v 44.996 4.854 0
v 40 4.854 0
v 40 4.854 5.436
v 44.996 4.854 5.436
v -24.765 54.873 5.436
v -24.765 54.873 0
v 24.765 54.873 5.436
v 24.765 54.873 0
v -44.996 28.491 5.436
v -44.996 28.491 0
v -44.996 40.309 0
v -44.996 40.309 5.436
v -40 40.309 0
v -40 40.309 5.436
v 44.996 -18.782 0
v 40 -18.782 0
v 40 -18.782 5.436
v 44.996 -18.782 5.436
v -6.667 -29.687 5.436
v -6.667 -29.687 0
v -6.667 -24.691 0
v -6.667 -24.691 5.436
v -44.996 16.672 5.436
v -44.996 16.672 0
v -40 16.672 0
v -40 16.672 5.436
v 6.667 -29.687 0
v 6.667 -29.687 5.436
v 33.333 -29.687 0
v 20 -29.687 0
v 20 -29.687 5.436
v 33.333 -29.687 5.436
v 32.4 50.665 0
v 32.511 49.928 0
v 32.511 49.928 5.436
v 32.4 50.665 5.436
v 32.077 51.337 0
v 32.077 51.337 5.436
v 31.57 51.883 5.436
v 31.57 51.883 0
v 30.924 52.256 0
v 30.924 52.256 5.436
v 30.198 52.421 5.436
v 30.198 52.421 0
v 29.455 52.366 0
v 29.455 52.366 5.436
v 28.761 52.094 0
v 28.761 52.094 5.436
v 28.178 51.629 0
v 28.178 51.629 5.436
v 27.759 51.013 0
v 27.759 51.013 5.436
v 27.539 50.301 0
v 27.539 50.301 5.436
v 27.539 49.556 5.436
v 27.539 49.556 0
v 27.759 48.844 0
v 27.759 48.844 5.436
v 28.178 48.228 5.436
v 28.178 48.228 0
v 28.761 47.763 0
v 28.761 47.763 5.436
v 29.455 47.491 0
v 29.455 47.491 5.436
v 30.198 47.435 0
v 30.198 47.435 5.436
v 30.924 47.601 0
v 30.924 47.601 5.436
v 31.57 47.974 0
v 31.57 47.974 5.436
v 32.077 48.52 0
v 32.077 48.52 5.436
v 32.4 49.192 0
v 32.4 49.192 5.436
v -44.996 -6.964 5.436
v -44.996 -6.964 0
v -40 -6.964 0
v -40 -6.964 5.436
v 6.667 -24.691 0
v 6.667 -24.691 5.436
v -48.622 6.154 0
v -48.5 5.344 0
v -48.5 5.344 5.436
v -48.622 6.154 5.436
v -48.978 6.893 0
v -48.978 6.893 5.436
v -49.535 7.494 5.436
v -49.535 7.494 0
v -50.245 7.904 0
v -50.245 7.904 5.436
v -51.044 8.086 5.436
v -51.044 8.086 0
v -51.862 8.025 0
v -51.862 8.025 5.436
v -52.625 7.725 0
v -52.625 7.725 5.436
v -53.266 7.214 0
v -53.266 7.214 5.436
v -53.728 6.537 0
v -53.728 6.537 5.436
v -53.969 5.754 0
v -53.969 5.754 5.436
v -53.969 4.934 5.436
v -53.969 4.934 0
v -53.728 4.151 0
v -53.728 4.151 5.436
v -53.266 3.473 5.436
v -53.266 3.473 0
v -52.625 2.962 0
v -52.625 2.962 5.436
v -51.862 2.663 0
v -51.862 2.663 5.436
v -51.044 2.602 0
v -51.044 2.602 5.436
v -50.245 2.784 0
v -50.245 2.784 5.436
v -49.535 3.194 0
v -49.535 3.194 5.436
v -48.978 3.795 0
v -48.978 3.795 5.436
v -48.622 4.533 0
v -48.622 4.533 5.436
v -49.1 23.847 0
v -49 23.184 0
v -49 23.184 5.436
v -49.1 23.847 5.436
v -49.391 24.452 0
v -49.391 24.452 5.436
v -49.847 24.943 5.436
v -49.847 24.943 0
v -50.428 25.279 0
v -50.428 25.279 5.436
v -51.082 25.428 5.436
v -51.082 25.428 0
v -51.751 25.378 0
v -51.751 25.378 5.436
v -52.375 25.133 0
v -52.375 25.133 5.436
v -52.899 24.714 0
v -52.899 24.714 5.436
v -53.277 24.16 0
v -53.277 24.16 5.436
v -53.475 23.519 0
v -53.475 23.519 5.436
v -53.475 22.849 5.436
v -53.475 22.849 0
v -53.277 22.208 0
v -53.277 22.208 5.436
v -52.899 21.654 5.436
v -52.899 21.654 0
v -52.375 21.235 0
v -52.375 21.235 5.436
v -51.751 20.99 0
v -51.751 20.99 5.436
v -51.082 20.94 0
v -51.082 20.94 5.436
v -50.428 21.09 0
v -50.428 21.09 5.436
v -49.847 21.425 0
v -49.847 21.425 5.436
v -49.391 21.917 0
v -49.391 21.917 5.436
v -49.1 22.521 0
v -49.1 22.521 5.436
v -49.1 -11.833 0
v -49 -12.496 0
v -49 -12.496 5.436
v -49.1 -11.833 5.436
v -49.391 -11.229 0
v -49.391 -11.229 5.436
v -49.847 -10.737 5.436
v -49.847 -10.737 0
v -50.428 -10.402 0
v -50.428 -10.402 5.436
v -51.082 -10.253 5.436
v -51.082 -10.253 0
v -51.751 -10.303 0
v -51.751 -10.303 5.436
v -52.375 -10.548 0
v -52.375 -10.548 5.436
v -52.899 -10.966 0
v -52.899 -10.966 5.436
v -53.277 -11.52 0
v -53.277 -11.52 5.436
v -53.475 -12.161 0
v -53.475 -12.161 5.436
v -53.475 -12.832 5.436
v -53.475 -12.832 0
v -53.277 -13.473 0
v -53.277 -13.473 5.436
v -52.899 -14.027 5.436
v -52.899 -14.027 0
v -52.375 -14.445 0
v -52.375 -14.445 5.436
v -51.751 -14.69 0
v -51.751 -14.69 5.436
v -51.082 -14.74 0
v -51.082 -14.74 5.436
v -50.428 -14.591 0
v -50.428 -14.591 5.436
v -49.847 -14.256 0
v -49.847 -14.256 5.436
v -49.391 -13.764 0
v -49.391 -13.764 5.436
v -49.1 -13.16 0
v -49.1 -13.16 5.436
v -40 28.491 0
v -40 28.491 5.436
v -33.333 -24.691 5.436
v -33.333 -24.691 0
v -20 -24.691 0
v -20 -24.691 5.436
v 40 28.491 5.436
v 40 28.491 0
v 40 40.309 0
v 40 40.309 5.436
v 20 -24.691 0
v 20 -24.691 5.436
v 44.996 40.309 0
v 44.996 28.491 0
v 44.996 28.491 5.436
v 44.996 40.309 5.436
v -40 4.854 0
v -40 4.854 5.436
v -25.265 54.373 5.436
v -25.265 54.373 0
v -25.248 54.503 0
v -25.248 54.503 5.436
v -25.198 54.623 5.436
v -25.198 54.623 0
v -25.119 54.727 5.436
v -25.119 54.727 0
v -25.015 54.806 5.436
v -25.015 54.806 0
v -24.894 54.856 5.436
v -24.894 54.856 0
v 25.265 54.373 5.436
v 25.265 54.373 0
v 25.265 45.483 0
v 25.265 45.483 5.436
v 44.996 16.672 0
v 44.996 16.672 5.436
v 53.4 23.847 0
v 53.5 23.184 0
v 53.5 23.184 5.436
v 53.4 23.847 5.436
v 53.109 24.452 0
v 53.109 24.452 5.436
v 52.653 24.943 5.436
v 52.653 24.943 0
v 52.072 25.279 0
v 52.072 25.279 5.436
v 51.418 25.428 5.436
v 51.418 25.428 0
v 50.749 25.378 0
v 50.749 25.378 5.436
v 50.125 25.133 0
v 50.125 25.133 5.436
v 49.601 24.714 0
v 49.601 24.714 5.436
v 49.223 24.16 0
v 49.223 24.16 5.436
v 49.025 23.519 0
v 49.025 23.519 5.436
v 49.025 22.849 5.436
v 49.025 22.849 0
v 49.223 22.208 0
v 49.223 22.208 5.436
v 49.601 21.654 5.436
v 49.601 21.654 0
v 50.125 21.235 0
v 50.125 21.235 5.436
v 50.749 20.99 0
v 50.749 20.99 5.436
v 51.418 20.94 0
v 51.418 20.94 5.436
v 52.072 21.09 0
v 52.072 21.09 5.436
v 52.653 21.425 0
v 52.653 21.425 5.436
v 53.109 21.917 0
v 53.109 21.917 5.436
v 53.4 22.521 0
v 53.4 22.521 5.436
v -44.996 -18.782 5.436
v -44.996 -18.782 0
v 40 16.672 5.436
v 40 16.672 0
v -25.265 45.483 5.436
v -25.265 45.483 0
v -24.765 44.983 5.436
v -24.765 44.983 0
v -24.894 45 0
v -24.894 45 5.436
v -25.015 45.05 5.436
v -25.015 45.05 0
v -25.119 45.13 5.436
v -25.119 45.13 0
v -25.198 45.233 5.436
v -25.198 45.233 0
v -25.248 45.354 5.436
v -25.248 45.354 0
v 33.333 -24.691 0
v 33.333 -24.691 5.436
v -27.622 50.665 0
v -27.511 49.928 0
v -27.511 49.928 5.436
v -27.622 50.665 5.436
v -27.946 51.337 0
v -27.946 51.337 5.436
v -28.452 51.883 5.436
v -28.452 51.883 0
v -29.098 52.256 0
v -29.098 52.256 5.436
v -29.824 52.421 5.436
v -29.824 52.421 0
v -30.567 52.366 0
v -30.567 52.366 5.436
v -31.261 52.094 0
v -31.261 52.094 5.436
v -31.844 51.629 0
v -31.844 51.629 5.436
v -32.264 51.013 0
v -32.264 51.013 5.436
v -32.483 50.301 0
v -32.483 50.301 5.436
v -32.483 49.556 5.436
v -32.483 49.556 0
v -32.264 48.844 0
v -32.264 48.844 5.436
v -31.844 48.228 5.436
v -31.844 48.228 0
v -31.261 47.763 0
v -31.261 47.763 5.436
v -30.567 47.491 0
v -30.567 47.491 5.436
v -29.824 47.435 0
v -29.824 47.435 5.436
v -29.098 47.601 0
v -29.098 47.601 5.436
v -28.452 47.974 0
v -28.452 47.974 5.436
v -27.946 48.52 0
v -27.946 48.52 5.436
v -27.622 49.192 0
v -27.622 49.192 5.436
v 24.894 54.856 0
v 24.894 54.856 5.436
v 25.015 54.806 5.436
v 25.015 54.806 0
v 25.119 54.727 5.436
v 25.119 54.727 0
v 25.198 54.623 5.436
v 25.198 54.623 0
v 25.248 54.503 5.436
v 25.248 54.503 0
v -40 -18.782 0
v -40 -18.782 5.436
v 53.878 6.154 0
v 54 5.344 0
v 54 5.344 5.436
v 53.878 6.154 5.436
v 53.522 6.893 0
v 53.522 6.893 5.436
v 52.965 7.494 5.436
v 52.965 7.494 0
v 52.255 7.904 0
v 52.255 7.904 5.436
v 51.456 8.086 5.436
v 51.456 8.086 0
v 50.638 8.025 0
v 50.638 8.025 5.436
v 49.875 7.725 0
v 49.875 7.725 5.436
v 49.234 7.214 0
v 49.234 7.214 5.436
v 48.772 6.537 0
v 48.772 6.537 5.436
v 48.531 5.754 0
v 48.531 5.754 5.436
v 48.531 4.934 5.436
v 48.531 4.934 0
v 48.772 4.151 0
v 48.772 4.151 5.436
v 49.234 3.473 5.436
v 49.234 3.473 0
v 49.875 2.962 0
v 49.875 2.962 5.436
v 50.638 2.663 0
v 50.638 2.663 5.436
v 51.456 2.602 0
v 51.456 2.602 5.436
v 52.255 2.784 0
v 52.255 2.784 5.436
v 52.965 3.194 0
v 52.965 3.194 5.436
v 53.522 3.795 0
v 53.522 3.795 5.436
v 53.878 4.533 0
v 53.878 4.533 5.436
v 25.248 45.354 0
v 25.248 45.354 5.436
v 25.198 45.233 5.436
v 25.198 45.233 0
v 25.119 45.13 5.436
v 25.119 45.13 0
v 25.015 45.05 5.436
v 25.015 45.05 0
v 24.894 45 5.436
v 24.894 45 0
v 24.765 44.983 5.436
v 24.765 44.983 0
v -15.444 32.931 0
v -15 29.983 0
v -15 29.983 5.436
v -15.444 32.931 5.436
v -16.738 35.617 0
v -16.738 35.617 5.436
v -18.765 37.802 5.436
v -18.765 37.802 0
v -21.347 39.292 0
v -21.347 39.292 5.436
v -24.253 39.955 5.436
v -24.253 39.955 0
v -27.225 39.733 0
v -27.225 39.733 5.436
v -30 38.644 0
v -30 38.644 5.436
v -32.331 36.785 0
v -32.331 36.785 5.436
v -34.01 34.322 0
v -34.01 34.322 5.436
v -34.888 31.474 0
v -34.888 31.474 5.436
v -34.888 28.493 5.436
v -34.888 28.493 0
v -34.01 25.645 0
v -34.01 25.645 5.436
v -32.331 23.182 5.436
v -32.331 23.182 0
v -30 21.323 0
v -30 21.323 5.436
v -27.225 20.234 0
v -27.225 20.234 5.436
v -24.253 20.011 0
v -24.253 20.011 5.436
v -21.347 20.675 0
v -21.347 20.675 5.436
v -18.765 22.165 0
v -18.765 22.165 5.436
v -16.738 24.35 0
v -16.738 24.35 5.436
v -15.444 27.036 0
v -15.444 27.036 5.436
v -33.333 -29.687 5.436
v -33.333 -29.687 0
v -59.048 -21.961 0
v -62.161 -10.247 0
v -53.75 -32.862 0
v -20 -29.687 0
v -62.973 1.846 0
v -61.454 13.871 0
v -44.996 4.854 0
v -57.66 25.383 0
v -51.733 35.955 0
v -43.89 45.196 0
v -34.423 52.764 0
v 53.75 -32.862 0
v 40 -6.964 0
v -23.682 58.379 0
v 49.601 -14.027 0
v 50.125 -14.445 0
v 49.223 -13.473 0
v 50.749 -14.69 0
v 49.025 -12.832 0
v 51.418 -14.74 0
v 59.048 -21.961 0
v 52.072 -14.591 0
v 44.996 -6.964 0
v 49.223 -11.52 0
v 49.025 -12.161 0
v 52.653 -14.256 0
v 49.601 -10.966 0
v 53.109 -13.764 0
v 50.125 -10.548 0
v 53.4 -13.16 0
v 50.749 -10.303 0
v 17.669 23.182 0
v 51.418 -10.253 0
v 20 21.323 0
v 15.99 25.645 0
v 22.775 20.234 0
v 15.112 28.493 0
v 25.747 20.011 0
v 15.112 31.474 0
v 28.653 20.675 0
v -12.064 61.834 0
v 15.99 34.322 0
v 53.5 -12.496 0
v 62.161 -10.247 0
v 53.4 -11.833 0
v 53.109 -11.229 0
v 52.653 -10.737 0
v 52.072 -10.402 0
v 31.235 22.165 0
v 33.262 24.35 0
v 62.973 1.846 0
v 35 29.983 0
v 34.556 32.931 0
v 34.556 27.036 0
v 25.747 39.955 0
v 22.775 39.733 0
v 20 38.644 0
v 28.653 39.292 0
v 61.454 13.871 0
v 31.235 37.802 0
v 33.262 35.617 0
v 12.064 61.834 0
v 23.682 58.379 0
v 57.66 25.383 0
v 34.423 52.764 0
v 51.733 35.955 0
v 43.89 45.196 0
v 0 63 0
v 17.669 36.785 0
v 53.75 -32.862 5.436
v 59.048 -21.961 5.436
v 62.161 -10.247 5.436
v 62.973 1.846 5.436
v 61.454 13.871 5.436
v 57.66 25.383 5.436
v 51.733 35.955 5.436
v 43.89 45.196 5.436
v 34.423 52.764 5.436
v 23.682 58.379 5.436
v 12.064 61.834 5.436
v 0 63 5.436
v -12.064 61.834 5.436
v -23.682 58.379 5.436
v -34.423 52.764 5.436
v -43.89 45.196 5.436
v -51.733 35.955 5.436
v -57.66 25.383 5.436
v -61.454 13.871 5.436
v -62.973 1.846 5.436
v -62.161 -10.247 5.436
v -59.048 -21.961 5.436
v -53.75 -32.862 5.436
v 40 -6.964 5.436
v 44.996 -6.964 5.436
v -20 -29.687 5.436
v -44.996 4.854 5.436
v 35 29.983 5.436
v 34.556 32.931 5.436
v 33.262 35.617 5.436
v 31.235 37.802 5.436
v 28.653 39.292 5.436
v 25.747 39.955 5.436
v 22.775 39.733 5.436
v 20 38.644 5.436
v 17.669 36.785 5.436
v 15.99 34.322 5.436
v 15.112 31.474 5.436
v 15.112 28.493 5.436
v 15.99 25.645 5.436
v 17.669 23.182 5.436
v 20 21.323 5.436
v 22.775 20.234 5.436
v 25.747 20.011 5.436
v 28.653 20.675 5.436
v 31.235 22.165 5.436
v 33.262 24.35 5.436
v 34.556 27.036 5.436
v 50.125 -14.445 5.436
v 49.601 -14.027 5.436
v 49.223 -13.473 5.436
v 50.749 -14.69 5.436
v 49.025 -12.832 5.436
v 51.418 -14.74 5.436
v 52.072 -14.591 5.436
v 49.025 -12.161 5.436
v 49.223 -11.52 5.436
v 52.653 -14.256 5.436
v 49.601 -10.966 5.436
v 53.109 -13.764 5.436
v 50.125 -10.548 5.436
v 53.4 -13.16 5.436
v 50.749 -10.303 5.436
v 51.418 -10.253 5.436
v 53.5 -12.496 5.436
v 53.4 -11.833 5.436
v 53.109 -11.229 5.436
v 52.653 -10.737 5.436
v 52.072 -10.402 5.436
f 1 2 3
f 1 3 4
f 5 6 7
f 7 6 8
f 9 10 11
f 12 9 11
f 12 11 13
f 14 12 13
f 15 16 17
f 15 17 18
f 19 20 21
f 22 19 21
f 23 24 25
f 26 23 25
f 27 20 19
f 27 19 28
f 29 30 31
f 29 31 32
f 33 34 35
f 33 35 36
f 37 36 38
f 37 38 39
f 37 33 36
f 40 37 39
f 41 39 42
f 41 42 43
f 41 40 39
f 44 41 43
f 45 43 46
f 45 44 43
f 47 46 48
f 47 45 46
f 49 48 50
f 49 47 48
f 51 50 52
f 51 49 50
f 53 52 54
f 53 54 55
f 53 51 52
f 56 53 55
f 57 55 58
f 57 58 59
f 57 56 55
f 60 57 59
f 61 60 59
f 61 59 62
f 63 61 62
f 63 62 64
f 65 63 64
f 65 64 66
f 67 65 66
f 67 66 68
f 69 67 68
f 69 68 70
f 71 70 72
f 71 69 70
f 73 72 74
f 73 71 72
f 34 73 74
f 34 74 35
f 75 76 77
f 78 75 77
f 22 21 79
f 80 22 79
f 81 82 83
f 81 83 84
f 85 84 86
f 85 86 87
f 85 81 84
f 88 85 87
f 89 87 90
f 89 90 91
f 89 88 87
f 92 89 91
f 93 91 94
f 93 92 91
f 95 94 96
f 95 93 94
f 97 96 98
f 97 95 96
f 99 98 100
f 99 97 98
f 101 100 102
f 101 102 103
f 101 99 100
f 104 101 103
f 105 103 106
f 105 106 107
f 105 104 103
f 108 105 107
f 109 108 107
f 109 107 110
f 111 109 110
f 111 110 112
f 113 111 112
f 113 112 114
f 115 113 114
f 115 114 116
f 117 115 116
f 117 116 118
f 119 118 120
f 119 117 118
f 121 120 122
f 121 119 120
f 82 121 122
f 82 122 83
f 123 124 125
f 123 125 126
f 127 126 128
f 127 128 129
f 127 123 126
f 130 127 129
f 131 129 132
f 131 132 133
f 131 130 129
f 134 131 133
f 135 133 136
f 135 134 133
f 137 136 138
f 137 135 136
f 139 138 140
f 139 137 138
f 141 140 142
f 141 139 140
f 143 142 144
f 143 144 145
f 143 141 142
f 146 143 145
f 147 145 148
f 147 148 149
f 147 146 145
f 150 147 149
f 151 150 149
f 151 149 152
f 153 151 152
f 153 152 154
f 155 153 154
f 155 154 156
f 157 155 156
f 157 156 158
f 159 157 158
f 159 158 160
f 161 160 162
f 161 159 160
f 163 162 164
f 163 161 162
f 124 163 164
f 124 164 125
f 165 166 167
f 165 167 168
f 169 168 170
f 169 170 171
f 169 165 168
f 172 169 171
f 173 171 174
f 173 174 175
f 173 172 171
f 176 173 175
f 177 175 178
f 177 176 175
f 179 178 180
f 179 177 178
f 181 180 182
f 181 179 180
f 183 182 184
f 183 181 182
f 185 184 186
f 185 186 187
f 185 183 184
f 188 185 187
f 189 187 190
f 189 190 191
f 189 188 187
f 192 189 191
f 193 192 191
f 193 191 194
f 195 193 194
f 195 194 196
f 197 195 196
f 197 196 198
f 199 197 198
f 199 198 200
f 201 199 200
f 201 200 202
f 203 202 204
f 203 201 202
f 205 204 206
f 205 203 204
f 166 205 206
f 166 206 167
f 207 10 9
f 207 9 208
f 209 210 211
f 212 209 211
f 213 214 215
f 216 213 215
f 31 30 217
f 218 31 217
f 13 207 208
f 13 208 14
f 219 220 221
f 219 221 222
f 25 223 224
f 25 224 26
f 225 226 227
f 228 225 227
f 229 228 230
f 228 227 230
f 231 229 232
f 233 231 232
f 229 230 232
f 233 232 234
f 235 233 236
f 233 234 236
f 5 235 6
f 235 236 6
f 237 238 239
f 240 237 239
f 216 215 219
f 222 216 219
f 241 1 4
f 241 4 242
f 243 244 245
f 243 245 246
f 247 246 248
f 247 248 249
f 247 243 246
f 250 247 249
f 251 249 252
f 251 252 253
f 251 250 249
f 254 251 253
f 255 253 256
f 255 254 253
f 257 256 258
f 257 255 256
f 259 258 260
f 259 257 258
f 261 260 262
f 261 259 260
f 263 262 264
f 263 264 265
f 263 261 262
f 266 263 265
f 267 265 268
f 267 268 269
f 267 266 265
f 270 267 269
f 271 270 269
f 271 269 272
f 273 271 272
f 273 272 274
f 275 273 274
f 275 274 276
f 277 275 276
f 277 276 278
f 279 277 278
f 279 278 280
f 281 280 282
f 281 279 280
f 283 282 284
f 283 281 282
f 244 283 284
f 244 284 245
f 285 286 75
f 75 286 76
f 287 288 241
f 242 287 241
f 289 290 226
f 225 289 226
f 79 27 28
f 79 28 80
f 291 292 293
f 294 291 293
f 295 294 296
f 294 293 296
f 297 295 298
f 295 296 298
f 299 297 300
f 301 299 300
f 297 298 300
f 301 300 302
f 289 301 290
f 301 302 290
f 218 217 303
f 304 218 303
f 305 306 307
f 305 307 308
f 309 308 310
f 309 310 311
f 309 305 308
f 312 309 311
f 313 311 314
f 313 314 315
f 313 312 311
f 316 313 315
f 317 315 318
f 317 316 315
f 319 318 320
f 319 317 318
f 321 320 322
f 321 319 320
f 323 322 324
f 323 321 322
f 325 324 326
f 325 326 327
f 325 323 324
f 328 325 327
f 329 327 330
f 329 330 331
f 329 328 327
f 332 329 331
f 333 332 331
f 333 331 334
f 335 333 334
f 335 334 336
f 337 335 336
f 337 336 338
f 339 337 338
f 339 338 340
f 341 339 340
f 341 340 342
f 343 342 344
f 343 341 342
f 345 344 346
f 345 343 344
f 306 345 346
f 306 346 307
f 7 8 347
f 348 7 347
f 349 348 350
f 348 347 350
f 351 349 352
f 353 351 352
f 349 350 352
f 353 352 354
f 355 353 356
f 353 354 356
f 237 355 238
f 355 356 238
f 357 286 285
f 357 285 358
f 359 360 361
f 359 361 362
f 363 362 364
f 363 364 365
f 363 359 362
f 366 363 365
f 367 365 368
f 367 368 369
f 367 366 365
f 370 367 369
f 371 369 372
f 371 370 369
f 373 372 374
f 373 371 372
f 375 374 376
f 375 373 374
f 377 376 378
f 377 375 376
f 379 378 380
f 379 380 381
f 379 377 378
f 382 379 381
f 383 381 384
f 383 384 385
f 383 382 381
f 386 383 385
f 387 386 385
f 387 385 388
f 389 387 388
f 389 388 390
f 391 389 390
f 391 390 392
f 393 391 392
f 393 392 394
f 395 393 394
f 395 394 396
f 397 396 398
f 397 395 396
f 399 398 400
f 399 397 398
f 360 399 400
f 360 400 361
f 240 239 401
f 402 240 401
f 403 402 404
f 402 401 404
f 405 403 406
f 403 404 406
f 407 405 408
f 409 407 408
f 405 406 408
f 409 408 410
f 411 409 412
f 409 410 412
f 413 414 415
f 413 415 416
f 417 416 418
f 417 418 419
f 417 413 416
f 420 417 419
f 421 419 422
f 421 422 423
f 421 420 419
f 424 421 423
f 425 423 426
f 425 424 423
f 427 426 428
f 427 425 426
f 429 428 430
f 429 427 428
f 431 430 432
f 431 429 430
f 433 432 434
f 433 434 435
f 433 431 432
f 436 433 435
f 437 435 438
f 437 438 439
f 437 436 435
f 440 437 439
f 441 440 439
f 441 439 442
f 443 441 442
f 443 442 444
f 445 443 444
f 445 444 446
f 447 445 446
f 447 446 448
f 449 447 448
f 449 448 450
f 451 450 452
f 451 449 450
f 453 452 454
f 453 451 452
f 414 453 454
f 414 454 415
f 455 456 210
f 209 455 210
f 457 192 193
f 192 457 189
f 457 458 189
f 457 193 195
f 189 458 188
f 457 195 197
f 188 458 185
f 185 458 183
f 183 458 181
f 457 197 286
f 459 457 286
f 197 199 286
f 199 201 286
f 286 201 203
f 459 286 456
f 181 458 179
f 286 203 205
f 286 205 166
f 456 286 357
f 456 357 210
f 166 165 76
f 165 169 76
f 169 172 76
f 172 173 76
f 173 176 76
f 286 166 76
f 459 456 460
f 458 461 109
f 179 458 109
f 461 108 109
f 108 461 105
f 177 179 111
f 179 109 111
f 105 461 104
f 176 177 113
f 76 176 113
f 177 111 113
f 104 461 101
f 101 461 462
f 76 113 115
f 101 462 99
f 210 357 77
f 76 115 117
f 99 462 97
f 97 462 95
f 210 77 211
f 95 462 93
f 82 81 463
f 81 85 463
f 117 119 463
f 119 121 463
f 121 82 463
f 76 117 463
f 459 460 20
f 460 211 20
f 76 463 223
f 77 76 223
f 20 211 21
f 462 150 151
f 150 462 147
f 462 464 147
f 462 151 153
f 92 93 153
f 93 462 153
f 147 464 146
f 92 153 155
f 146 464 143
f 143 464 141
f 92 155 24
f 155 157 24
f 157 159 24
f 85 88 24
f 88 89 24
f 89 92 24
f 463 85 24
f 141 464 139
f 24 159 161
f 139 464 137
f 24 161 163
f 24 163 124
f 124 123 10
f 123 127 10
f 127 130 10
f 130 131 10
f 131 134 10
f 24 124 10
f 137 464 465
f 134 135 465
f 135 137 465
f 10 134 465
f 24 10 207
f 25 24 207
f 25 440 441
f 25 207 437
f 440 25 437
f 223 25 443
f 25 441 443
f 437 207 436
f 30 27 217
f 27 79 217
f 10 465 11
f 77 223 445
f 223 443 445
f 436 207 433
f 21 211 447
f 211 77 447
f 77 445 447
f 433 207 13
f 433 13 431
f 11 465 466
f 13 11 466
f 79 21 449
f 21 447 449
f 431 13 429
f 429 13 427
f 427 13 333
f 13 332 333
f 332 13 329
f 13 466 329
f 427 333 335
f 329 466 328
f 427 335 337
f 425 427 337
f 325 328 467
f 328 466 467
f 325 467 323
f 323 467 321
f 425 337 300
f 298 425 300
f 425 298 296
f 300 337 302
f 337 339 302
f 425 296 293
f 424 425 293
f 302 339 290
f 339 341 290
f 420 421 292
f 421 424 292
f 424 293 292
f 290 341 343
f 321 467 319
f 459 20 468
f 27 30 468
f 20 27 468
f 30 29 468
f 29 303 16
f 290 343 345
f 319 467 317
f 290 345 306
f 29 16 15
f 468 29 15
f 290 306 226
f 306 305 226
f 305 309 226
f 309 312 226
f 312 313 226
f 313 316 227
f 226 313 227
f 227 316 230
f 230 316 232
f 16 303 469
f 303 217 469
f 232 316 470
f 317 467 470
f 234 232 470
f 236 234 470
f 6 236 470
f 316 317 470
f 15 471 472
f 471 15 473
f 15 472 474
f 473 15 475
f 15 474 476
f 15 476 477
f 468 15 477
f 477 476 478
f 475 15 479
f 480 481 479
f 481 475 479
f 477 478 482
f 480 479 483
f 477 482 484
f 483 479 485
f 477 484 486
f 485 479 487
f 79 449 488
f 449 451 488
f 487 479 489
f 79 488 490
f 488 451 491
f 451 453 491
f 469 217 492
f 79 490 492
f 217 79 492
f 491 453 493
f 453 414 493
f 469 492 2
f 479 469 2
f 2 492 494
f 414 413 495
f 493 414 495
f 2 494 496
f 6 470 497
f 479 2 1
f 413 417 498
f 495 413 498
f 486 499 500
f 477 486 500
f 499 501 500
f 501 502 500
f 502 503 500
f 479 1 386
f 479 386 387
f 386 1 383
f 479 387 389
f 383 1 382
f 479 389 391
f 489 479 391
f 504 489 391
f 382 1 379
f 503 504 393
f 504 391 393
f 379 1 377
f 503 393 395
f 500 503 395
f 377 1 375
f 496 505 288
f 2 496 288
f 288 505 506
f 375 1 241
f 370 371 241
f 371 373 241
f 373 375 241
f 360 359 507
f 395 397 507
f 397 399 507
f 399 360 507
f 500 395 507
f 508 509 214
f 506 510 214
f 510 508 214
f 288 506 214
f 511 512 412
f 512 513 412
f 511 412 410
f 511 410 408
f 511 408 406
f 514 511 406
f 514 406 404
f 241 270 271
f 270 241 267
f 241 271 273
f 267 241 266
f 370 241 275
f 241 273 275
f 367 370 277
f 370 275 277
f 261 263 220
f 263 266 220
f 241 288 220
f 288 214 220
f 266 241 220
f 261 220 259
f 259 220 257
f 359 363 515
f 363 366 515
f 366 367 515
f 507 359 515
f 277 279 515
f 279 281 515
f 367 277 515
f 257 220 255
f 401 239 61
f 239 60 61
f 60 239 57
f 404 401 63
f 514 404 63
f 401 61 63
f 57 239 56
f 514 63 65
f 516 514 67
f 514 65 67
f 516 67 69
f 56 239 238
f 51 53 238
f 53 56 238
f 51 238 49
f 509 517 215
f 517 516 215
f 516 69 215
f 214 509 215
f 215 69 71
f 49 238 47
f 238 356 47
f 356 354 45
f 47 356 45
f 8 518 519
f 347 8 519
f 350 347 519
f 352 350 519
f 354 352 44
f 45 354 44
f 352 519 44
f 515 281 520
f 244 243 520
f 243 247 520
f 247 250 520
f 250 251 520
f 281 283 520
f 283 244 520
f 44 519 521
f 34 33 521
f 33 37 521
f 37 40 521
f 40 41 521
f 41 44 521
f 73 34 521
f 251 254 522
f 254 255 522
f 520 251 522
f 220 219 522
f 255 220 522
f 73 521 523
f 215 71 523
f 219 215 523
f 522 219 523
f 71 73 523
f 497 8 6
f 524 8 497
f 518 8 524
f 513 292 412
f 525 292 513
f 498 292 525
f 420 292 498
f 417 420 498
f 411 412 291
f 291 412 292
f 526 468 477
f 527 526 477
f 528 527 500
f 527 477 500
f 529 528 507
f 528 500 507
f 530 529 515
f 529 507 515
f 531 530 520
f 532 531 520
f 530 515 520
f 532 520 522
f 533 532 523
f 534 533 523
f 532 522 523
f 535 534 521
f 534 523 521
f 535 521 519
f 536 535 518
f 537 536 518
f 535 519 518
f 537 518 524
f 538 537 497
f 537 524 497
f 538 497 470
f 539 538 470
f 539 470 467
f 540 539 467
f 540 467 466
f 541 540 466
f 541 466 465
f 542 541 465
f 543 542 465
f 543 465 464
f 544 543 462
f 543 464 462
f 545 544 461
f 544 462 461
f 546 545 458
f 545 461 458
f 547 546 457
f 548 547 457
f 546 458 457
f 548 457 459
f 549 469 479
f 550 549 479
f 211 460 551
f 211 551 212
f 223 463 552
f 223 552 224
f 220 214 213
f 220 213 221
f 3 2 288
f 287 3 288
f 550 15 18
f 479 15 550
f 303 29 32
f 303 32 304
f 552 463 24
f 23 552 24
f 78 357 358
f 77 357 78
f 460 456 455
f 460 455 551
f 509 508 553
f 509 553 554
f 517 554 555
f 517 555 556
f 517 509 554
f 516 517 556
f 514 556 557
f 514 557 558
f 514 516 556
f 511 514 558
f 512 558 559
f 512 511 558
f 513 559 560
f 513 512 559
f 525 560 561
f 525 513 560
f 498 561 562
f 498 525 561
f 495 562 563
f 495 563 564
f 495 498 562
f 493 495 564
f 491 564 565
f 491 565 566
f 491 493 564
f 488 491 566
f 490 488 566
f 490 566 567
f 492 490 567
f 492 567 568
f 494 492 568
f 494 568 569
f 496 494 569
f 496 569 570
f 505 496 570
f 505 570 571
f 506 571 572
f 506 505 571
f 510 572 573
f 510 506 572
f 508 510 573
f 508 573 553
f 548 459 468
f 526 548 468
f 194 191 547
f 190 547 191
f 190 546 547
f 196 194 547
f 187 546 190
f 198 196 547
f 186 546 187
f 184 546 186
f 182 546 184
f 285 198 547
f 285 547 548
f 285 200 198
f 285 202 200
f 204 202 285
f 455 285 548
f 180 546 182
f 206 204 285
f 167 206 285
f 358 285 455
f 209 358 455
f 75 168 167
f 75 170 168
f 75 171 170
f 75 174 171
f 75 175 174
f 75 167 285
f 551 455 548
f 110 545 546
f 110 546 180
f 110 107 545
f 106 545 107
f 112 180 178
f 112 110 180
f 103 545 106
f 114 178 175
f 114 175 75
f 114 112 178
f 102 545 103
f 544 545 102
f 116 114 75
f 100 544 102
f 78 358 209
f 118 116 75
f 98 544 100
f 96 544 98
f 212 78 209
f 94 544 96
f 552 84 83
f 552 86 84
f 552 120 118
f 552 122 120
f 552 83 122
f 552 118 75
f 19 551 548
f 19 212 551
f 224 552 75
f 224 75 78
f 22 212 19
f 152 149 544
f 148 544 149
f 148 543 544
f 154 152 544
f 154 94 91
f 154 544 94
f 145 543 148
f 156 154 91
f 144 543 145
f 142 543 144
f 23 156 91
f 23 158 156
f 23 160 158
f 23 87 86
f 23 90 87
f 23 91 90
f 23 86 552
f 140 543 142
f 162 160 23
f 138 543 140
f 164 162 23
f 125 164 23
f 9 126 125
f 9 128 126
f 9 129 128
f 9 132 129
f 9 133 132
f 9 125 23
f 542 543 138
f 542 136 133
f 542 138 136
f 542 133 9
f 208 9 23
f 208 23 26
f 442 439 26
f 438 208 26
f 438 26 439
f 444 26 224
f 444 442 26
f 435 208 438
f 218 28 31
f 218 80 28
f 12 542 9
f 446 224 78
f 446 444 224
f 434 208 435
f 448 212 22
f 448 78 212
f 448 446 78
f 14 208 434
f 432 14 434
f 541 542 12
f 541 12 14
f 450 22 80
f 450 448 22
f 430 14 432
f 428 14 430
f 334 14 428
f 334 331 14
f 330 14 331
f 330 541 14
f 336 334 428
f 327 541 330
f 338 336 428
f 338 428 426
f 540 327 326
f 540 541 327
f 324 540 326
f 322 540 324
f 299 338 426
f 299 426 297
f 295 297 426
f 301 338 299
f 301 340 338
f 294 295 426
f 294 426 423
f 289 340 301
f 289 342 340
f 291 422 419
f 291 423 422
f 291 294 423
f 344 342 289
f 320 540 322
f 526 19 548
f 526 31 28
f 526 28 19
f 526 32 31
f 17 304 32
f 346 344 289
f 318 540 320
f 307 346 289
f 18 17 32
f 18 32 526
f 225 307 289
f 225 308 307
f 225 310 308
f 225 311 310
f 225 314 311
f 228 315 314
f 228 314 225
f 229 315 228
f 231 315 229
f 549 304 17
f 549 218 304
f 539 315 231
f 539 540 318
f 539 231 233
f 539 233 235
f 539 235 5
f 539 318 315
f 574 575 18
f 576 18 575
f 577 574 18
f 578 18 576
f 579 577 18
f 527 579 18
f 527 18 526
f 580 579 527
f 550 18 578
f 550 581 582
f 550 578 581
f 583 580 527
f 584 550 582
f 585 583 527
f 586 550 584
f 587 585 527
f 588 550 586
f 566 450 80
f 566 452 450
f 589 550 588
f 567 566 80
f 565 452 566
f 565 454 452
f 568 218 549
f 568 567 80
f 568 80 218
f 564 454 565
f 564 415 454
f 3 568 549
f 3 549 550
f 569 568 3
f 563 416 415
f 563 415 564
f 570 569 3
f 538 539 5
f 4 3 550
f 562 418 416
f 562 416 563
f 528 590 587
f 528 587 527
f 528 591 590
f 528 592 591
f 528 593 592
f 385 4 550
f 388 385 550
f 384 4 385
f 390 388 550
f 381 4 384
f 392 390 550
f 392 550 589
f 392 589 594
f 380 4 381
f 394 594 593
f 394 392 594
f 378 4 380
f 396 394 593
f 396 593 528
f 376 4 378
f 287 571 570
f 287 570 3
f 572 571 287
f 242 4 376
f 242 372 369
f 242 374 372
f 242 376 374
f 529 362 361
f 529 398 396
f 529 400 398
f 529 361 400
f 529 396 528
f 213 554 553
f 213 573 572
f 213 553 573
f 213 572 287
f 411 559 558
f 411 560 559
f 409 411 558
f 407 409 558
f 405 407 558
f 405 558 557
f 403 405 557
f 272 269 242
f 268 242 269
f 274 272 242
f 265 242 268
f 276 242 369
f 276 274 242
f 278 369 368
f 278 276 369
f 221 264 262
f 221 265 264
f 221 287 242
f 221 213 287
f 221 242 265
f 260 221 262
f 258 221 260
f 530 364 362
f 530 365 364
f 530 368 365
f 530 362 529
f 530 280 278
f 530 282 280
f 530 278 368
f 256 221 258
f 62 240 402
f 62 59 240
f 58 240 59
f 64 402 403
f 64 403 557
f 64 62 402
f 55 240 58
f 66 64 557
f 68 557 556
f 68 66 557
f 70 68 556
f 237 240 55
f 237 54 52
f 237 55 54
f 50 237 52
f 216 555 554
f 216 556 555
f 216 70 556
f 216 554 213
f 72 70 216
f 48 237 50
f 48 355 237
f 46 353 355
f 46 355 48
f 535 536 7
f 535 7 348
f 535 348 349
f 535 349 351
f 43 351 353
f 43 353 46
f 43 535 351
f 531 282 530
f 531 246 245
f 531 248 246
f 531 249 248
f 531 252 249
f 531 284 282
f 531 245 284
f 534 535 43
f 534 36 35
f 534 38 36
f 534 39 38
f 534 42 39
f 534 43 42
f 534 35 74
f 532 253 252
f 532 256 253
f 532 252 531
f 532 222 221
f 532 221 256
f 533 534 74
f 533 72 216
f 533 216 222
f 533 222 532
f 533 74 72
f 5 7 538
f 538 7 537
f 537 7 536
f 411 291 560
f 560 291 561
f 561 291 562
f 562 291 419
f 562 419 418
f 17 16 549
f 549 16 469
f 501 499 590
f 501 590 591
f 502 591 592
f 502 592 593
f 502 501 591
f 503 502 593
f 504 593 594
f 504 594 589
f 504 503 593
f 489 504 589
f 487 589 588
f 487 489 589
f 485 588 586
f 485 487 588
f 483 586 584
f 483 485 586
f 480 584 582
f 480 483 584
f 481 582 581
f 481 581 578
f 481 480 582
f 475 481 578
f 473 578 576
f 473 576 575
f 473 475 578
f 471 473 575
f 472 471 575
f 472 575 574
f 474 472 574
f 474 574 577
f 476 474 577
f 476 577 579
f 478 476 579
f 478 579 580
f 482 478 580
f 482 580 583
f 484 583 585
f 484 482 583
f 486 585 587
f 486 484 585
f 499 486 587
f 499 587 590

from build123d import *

# Parameters (mm, degrees)
SKETCH1_R           = 2.25
SKETCH1_R_2         = 2.75
SKETCH1_R_3         = 2.5
SKETCH1_R_4         = 10
SKETCH1_W           = 13.333333333
SKETCH1_H           = 4.9958
SKETCH1_W_2         = 4.9958
SKETCH1_H_2         = 11.818181818
SKETCH1_H_3         = 11.818181819
SKETCH1_W_3         = 13.333333334
BOSS_EXTRUDE1_DEPTH = 5.4356


with BuildPart() as part:
    # Sketch1 → Boss-Extrude1 (new body)
    with BuildSketch(Plane.XY):
        with BuildLine():
            Line((-53.750203106, -32.862070326), (53.750203106, -32.862070326))
            ThreePointArc((53.750203106, -32.862070326), (0, 63), (-53.750203106, -32.862070326))
        make_face()
        with Locations((51.25, 23.184046239)):
            Circle(SKETCH1_R, mode=Mode.SUBTRACT)
        with Locations((51.25, -12.496398734)):
            Circle(SKETCH1_R, mode=Mode.SUBTRACT)
        with Locations((-51.25, -12.496398734)):
            Circle(SKETCH1_R, mode=Mode.SUBTRACT)
        with Locations((-51.25, 23.184046239)):
            Circle(SKETCH1_R, mode=Mode.SUBTRACT)
        with Locations((-51.25, 5.343823752)):
            Circle(SKETCH1_R_2, mode=Mode.SUBTRACT)
        with Locations((51.25, 5.343823752)):
            Circle(SKETCH1_R_2, mode=Mode.SUBTRACT)
        with Locations((-30.011103704, 49.928449687)):
            Circle(SKETCH1_R_3, mode=Mode.SUBTRACT)
        with Locations((30.011103704, 49.928449687)):
            Circle(SKETCH1_R_3, mode=Mode.SUBTRACT)
        with Locations((-25, 29.983449687)):
            Circle(SKETCH1_R_4, mode=Mode.SUBTRACT)
        with Locations((25, 29.983449687)):
            Circle(SKETCH1_R_4, mode=Mode.SUBTRACT)
        with BuildLine():
            Line((-24.765, 54.873449687), (24.765, 54.873449687))
            ThreePointArc((24.765, 54.873449687), (25.118553391, 54.727003078), (25.265, 54.373449687))
            Line((25.265, 54.373449687), (25.265, 45.483449687))
            ThreePointArc((25.265, 45.483449687), (25.118553391, 45.129896297), (24.765, 44.983449687))
            Line((24.765, 44.983449687), (-24.765, 44.983449687))
            ThreePointArc((-24.765, 44.983449687), (-25.118553391, 45.129896297), (-25.265, 45.483449687))
            Line((-25.265, 45.483449687), (-25.265, 54.373449687))
            ThreePointArc((-25.265, 54.373449687), (-25.118553391, 54.727003078), (-24.765, 54.873449687))
        make_face(mode=Mode.SUBTRACT)
        with Locations((-26.666666666, -27.189170326)):
            Rectangle(SKETCH1_W, SKETCH1_H, mode=Mode.SUBTRACT)
        with Locations((42.4979, 34.399638765)):
            Rectangle(SKETCH1_W_2, SKETCH1_H_2, mode=Mode.SUBTRACT)
        with Locations((42.4979, 10.763275129)):
            Rectangle(SKETCH1_W_2, SKETCH1_H_3, mode=Mode.SUBTRACT)
        with Locations((-42.4979, 34.399638765)):
            Rectangle(SKETCH1_W_2, SKETCH1_H_2, mode=Mode.SUBTRACT)
        with Locations((-42.4979, 10.763275129)):
            Rectangle(SKETCH1_W_2, SKETCH1_H_3, mode=Mode.SUBTRACT)
        with Locations((-42.4979, -12.873088508)):
            Rectangle(SKETCH1_W_2, SKETCH1_H_2, mode=Mode.SUBTRACT)
        with Locations((42.4979, -12.873088508)):
            Rectangle(SKETCH1_W_2, SKETCH1_H_2, mode=Mode.SUBTRACT)
        with Locations((0, -27.189170326)):
            Rectangle(SKETCH1_W_3, SKETCH1_H, mode=Mode.SUBTRACT)
        with Locations((26.666666666, -27.189170326)):
            Rectangle(SKETCH1_W, SKETCH1_H, mode=Mode.SUBTRACT)
    extrude(amount=BOSS_EXTRUDE1_DEPTH)


solid = part.part
